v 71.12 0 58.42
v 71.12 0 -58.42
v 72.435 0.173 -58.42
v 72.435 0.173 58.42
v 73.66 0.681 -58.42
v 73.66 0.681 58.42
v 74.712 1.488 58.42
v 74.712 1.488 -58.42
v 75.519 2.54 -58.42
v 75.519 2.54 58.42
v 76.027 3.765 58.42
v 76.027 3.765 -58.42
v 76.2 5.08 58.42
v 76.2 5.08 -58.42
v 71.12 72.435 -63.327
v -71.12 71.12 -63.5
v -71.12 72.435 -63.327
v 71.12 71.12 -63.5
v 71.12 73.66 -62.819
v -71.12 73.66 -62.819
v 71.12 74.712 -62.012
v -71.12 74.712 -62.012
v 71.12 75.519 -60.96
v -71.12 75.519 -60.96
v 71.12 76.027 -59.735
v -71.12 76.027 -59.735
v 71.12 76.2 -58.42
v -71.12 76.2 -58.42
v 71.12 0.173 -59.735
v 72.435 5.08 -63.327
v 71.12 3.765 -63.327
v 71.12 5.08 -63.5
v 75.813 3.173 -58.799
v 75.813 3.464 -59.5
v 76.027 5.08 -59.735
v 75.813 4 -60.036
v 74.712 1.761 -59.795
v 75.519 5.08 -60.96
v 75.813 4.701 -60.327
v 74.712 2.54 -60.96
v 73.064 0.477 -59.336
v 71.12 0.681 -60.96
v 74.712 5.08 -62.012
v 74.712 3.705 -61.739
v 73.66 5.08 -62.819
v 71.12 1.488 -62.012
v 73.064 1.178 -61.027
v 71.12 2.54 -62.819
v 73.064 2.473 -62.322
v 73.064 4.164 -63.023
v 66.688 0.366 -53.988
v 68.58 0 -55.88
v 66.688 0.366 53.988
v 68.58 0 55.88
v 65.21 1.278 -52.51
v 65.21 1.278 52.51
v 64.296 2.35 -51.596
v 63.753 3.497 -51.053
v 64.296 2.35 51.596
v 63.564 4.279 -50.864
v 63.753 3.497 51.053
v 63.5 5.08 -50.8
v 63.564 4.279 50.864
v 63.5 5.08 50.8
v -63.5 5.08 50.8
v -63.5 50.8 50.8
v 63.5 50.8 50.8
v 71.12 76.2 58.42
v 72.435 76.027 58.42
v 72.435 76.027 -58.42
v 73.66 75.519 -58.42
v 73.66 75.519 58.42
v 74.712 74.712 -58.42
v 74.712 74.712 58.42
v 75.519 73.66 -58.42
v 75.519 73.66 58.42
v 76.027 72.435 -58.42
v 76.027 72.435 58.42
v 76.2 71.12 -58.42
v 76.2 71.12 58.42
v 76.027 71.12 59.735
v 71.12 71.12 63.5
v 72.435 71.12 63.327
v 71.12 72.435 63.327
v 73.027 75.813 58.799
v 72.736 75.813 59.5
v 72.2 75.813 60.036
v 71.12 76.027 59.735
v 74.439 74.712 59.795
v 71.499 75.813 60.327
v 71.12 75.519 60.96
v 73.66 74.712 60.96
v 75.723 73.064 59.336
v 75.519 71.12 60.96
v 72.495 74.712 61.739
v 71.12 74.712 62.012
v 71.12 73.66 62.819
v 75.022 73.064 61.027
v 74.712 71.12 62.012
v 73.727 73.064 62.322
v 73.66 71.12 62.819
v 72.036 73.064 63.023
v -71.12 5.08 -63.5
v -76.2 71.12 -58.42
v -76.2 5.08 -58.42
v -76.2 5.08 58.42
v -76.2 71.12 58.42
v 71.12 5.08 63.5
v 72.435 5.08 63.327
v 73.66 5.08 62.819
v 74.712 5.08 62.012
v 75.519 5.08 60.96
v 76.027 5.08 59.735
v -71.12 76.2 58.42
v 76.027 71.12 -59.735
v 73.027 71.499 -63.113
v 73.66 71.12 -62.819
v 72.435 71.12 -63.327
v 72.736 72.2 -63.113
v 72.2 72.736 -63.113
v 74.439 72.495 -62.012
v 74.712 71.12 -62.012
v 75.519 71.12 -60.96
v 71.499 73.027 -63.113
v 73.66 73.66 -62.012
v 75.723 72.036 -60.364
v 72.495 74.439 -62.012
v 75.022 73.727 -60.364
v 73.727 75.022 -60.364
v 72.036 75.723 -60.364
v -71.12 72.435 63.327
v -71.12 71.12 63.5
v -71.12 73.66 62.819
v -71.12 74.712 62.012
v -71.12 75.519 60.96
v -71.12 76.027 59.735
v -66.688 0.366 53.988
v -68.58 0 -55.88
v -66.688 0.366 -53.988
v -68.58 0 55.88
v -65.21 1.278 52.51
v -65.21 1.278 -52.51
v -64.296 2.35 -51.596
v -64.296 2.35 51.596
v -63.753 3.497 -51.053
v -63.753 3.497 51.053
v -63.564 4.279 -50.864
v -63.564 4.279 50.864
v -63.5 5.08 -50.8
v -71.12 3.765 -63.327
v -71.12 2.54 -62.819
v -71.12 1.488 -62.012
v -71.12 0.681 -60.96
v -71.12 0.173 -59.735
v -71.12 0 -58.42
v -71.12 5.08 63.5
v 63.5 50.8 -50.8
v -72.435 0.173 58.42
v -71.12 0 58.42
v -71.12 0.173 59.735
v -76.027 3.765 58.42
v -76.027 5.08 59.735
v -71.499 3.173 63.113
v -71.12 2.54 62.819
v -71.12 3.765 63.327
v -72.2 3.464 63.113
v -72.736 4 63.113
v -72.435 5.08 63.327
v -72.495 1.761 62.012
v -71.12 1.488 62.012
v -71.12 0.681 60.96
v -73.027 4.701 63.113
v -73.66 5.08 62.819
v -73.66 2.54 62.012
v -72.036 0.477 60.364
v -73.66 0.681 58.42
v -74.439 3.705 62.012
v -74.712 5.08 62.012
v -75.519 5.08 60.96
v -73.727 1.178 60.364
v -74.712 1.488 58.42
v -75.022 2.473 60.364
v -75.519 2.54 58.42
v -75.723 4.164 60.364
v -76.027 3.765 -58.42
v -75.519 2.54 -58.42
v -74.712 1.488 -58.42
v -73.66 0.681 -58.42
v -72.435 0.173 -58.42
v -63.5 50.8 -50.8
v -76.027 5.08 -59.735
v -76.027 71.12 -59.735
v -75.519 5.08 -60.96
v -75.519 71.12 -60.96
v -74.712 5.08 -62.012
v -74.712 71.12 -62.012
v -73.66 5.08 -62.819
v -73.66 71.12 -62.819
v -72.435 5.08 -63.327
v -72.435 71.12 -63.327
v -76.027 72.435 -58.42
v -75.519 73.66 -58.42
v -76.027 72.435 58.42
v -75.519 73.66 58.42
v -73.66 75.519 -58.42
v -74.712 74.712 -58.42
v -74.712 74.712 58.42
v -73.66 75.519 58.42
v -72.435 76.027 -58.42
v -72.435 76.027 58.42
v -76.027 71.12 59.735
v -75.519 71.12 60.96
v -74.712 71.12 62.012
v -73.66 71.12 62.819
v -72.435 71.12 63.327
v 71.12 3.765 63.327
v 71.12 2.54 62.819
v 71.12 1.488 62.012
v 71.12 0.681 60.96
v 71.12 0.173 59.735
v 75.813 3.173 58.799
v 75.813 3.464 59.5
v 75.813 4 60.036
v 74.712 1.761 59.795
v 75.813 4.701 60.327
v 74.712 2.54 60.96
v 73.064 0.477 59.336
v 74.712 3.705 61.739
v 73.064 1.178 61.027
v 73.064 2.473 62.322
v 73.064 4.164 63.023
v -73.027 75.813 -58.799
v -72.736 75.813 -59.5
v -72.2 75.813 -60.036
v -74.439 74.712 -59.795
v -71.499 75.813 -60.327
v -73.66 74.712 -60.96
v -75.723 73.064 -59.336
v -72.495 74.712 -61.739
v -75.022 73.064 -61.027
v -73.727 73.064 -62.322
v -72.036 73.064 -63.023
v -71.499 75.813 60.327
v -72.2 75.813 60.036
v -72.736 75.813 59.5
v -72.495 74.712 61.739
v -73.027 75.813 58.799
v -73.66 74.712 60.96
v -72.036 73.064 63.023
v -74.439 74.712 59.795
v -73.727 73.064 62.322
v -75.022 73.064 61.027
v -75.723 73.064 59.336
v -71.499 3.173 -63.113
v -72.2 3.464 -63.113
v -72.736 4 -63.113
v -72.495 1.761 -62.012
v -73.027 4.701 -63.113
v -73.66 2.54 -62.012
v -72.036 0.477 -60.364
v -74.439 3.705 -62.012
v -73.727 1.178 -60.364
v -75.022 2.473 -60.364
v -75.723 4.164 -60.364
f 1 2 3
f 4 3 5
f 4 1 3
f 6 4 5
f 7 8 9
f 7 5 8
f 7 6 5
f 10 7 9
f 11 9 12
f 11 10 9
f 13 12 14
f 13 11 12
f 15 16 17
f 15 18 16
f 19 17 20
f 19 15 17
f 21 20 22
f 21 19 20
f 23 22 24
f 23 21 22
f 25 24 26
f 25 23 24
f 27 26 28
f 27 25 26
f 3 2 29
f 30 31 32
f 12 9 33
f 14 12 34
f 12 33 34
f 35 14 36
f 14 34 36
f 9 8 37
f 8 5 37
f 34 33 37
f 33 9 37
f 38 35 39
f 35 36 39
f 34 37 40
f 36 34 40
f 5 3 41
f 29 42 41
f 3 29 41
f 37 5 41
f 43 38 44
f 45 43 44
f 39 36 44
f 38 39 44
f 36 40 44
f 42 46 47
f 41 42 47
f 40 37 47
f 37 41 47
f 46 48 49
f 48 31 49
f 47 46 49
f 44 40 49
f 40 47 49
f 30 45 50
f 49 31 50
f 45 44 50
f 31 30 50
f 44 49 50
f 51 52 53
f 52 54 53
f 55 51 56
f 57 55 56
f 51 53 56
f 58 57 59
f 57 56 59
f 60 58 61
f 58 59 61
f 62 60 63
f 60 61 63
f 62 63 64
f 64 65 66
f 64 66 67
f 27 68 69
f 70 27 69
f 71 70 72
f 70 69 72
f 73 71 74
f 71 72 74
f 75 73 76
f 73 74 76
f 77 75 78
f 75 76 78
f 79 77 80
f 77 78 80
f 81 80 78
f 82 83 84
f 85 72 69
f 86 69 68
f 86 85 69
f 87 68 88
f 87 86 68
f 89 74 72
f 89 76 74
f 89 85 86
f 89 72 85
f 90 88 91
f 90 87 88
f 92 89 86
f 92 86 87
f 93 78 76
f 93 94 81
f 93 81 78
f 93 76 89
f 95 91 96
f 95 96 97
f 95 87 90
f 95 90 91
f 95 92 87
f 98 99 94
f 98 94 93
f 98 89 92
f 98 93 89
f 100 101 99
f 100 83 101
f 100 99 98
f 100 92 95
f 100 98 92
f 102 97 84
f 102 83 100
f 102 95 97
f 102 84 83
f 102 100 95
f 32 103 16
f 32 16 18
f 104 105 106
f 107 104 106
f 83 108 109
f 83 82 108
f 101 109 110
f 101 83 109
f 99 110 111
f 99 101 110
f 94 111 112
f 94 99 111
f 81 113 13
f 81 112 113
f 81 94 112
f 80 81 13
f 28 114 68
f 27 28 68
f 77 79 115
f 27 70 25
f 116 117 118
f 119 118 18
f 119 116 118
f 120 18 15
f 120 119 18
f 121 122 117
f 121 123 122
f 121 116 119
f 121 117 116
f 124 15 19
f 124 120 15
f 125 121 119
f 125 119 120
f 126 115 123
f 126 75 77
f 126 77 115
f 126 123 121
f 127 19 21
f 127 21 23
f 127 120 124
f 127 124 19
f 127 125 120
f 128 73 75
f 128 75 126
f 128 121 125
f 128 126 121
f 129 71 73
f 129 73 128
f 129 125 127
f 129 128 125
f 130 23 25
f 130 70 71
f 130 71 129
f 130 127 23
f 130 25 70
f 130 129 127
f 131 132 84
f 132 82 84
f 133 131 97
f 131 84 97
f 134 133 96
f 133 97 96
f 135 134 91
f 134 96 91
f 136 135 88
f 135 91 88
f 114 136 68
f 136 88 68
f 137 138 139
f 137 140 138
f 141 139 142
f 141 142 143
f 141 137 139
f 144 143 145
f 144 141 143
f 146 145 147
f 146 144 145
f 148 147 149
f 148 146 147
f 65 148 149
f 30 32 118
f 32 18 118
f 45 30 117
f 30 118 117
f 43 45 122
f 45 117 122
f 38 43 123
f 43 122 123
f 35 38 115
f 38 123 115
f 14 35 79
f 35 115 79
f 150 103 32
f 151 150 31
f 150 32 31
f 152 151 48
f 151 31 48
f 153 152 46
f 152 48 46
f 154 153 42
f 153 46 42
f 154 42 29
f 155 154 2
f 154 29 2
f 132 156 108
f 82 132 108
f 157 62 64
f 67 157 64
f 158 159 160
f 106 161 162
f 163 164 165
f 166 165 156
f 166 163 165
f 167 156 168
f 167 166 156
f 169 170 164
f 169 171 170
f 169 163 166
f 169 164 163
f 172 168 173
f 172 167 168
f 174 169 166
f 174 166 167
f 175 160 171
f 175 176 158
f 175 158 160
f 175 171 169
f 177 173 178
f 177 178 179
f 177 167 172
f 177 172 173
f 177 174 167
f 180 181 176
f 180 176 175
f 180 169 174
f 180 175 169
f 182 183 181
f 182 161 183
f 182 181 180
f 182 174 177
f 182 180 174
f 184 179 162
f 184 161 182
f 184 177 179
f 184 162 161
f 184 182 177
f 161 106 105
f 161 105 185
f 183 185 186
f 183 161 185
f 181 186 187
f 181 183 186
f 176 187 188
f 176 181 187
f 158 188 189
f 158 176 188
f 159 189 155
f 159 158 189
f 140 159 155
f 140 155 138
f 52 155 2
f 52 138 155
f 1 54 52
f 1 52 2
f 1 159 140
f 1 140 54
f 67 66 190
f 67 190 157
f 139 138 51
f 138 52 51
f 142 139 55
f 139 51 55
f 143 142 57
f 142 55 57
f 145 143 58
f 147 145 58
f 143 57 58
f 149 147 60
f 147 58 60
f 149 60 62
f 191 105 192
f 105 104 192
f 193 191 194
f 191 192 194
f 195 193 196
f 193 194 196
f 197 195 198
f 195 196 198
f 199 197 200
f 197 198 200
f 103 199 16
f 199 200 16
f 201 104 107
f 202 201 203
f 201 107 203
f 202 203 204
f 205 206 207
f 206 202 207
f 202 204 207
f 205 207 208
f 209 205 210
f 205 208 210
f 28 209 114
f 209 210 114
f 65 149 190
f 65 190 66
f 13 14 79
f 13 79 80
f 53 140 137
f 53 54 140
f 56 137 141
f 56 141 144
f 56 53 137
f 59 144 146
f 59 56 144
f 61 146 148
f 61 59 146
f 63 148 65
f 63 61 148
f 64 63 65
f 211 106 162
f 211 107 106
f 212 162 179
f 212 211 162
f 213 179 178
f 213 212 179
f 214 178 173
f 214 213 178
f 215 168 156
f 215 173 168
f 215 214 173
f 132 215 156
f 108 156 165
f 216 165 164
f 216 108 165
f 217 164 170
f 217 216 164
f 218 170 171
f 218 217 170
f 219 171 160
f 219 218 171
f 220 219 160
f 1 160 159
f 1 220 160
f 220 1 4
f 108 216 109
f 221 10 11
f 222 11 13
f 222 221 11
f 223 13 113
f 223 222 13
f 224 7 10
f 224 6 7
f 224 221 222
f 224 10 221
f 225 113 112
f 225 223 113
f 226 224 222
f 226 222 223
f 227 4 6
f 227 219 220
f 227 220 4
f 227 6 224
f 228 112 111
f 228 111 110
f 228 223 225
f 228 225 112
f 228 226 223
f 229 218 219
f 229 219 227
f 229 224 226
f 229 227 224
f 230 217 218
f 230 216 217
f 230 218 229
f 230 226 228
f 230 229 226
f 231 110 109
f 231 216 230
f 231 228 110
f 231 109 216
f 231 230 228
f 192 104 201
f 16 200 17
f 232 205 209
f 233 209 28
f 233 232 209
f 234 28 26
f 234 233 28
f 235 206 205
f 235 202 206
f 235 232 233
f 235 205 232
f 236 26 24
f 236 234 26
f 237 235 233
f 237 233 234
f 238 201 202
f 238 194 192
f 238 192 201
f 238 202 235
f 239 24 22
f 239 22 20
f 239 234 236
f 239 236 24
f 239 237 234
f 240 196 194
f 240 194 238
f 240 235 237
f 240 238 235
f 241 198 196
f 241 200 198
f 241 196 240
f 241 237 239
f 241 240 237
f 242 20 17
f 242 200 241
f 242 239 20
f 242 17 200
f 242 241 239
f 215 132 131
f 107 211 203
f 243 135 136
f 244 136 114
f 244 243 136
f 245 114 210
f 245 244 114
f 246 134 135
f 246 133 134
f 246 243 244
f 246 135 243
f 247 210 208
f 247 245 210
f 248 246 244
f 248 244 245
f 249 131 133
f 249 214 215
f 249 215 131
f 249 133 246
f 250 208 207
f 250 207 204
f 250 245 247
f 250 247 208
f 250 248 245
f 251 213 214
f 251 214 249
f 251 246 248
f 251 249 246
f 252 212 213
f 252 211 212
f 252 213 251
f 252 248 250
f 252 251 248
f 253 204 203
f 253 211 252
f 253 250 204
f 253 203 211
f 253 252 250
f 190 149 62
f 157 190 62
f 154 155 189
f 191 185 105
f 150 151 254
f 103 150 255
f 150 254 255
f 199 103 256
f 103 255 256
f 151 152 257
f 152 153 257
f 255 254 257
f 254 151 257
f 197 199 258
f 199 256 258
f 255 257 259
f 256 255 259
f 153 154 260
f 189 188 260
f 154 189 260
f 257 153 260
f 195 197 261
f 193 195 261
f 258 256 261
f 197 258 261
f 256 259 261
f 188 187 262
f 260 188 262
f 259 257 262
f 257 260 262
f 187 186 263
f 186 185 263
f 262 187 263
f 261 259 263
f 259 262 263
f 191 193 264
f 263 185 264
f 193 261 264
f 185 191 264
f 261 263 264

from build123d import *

# Parameters (mm, degrees)
F0_W     = 152.4
F0_H     = 127
F1_DEPTH = 76.2
F2_W     = 127
F2_H     = 101.6
F3_DEPTH = 50.8
F4_R     = 5.08


with BuildPart() as f1:
    # F0 (on Front) → F1 (new body)
    with BuildSketch(Plane.XZ):
        Rectangle(F0_W, F0_H)
    extrude(amount=-F1_DEPTH)

    # F2 (on face) → F3 (cut)
    with BuildSketch(Plane.XZ):
        Rectangle(F2_W, F2_H)
    extrude(amount=-F3_DEPTH, mode=Mode.SUBTRACT)

    # F4
    f4_edges = [f1.edges().sort_by_distance(p)[0] for p in [
        (-76.2, 0, 0),
        (0, 0, 63.5),
        (0, 0, 50.8),
        (-63.5, 0, 0),
        (0, 0, -50.8),
        (0, 0, -63.5),
        (76.2, 0, 0),
        (63.5, 0, 0),
        (76.2, 38.1, 63.5),
        (76.2, 76.2, 0),
        (76.2, 38.1, -63.5),
        (-76.2, 38.1, 63.5),
        (0, 76.2, 63.5),
        (-76.2, 38.1, -63.5),
        (-76.2, 76.2, 0),
        (0, 76.2, -63.5),
    ]]
    fillet(f4_edges, radius=F4_R)


solid = f1.part
